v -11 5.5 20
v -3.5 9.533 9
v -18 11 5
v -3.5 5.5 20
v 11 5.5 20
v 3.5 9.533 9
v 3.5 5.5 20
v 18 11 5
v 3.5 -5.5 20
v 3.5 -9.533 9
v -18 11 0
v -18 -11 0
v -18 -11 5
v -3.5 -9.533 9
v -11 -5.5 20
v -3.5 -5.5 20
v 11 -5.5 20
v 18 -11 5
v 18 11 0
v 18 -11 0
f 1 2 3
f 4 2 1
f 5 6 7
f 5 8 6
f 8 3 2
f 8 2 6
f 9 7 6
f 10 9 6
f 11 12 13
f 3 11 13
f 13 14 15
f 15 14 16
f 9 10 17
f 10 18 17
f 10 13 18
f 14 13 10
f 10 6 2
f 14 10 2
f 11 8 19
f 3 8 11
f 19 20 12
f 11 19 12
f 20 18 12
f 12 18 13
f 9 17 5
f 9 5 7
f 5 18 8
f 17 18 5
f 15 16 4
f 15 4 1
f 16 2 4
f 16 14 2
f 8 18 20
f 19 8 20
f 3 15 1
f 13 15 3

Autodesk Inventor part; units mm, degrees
ref_plane "YZ Plane" through (0, 0, 0) normal (1, 0, 0) x (0, 1, 0)
ref_plane "XZ Plane" through (0, 0, 0) normal (0, 1, 0) x (-1, 0, 0)
ref_plane "XY Plane" through (0, 0, 0) normal (0, 0, 1) x (1, 0, 0)
sketch "草图2" plane through (0, 0, 0) normal (0, 1, 0) x (-1, 0, 0)
  line L0 (-18, 0) -> (18, 0)
  line L1 (18, 0) -> (18, 5)
  line L2 (18, 5) -> (-18, 5)
  line L3 (-18, 5) -> (-18, 0)
  line L4 (-18, 5) -> (-11, 20)
  line L5 (-11, 20) -> (-3.5, 20)
  line L6 (-3.5, 20) -> (-3.5, 9)
  line L7 (-3.5, 9) -> (3.5, 9)
  line L8 (3.5, 9) -> (3.5, 20)
  line L9 (3.5, 20) -> (11, 20)
  line L10 (11, 20) -> (18, 5)
  point P0 (0, 0)
  point P1 (0, 0)
  point P2 (0, 5)
  point P3 (0, 9)
  dimension "d0" = 36
  dimension "d1" = 5
  dimension "d2" = 20
  dimension "d3" = 11
  dimension "d4" = 7
  dimension "d5" = 22
extrude "拉伸1" add sketch "草图2" along normal mid plane 22 contours L3 L2 L1 L0
extrude "拉伸2" add sketch "草图2" along normal mid plane 22 contours L4 L5 L6 L7 L8 L9 L10 L2
sketch "草图3" plane through (18, -11, 0) normal (1, 0, 0) x (0, 0, -1)
  line L0 (-5, 22) -> (-5, 0) projected
  line L1 (-20, 22) -> (-5, 22) projected
  line L2 (-20, 0) -> (-20, 22) projected
  line L3 (-5, 0) -> (-20, 0) projected
  line L4 (0, 0) -> (0, 22) projected
  line L5 (-5, 22) -> (0, 22) projected
  line L6 (-5, 22) -> (-5, 0) projected
  line L7 (0, 0) -> (-5, 0) projected
  line L8 (-5, 0) -> (-20, 5.5)
  line L9 (-5, 22) -> (-20, 16.5)
  line L10 (-20, 0) -> (-20, 22) projected
  line L11 (-20, 16.5) -> (-20, 5.5)
  line L12 (-5, 0) -> (-5, 22) projected
  line L13 (-5, 0) -> (-5, 22)
  line L14 (-5, 0) -> (0, 0)
  line L15 (0, 0) -> (0, 22) projected
  line L16 (0, 22) -> (0, 0)
  line L17 (-5, 22) -> (0, 22) projected
  line L18 (-5, 22) -> (0, 22)
  point P0 (0, 11)
  dimension "d10" = 11
extrude "拉伸3" cut sketch "草图3" against normal blind 36 contours L5 L4 L7 L0 | L0 L8 L2 L9 keep common part
